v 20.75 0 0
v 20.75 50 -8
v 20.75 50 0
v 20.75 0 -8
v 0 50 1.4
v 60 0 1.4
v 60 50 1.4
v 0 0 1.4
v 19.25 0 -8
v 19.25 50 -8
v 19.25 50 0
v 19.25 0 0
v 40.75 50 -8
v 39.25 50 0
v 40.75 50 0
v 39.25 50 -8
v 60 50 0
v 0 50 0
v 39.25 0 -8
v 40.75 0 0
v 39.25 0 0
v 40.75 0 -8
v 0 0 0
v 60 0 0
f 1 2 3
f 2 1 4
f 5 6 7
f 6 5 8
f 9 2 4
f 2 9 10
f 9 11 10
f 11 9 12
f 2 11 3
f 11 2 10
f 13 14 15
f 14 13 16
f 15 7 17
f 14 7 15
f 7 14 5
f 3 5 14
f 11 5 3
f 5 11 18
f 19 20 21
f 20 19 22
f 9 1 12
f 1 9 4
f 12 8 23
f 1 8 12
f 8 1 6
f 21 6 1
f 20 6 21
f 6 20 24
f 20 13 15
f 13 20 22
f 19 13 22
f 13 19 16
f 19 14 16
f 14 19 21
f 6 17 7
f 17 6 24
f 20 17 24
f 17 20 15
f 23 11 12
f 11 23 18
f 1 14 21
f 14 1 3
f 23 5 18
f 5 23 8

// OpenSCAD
$fn = 32;

// ----------------------------------------------------------------------
// Ribbed panel: 1.4 mm panel
// ----------------------------------------------------------------------

// --- parameters (mm) ---
panel_l = 60;             // panel length, X
panel_w = 50;             // panel width, Y
panel_t = 1.4;            // panel thickness, Z
rib_t = 1.5;              // rib thickness
rib_h = 8;                // rib height below the panel
ribs = 2;                 // number of ribs
fit_tol = 0.1;            // tolerance for press fits, mm
free_tol = 0.5;           // tolerance for clearance fits, mm

total_h = panel_t + rib_h;  // overall height

union() {
  cube([panel_l, panel_w, panel_t]);
  for (i = [1 : ribs])
    translate([i * panel_l / (ribs + 1) - rib_t / 2, 0, -rib_h])
      cube([rib_t, panel_w, rib_h + panel_t]);
}
